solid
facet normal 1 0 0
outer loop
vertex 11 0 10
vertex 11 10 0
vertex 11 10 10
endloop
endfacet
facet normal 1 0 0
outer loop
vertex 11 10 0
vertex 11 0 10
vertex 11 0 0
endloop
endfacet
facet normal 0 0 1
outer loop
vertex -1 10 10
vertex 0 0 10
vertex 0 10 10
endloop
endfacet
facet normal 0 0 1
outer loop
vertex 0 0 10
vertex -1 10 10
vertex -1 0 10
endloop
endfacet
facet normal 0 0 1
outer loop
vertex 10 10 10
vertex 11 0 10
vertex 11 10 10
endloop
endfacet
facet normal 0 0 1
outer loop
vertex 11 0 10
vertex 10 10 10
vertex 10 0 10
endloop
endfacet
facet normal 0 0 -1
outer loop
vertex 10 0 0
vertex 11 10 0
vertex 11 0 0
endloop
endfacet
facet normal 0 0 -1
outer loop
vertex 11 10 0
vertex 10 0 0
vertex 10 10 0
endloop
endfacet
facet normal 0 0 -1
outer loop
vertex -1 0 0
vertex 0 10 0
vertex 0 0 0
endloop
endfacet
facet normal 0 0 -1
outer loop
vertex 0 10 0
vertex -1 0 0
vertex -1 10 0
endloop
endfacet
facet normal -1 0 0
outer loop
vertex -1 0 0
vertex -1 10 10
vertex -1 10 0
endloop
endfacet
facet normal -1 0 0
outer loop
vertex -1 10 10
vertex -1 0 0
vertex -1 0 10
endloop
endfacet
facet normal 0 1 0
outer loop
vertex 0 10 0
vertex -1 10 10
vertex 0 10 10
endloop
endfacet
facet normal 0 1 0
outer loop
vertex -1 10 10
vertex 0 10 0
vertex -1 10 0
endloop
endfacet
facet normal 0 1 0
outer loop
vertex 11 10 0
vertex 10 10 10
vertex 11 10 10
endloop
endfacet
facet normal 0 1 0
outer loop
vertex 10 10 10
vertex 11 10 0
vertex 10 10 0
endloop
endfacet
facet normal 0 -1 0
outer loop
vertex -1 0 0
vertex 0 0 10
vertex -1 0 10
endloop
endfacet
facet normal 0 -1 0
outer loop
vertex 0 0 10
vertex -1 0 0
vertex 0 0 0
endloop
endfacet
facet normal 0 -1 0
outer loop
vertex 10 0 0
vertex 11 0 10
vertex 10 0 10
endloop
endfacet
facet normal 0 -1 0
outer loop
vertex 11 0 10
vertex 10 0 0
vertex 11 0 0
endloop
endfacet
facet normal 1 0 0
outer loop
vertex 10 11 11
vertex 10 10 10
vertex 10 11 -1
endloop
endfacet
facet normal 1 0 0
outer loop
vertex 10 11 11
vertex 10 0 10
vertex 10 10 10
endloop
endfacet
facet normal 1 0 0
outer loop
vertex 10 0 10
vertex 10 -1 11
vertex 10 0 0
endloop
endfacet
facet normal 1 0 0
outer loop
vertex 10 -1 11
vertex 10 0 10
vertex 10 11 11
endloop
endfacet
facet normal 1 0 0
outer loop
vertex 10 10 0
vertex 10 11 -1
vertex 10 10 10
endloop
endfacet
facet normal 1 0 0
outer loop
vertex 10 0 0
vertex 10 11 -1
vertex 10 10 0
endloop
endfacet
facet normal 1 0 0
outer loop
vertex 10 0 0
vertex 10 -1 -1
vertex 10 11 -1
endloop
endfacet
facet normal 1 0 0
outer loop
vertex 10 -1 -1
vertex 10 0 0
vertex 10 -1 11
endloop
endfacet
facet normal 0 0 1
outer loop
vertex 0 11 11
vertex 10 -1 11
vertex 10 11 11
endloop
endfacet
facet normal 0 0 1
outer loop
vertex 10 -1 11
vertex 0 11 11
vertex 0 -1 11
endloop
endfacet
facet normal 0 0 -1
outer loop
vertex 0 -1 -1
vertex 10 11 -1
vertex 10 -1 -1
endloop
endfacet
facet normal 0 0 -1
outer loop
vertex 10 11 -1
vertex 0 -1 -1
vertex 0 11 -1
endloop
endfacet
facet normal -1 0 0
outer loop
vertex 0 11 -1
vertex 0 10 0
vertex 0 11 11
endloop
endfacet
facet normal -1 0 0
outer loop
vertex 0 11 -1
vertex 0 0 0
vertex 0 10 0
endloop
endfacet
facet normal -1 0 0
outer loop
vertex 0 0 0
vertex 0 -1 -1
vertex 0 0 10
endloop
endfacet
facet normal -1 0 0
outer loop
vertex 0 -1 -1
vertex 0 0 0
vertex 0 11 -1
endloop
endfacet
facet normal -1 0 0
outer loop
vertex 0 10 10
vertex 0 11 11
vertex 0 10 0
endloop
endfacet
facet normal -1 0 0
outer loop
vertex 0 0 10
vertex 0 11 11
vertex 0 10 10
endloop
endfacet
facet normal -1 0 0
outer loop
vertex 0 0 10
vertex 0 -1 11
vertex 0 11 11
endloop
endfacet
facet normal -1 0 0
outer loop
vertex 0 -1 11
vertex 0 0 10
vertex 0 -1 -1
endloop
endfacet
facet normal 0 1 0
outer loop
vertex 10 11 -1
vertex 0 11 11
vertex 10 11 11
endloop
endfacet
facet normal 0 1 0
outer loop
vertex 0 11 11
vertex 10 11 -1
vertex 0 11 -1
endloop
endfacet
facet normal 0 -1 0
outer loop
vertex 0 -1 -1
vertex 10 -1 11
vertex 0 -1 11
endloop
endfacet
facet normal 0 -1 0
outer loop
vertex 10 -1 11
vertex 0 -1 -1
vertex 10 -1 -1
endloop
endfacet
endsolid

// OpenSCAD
// Unit of length: Unit.MM
union()
{
   color(c = [1.0, 0.0, 0.0, 1.0])
   {
      translate(v = [-1.0, 0.0, 0.0])
      {
         cube(size = [12.0, 10.0, 10.0], center = false);
      }
   }
   translate(v = [0.0, -1.0, -1.0])
   {
      cube(size = [10.0, 12.0, 12.0], center = false);
   }
}
